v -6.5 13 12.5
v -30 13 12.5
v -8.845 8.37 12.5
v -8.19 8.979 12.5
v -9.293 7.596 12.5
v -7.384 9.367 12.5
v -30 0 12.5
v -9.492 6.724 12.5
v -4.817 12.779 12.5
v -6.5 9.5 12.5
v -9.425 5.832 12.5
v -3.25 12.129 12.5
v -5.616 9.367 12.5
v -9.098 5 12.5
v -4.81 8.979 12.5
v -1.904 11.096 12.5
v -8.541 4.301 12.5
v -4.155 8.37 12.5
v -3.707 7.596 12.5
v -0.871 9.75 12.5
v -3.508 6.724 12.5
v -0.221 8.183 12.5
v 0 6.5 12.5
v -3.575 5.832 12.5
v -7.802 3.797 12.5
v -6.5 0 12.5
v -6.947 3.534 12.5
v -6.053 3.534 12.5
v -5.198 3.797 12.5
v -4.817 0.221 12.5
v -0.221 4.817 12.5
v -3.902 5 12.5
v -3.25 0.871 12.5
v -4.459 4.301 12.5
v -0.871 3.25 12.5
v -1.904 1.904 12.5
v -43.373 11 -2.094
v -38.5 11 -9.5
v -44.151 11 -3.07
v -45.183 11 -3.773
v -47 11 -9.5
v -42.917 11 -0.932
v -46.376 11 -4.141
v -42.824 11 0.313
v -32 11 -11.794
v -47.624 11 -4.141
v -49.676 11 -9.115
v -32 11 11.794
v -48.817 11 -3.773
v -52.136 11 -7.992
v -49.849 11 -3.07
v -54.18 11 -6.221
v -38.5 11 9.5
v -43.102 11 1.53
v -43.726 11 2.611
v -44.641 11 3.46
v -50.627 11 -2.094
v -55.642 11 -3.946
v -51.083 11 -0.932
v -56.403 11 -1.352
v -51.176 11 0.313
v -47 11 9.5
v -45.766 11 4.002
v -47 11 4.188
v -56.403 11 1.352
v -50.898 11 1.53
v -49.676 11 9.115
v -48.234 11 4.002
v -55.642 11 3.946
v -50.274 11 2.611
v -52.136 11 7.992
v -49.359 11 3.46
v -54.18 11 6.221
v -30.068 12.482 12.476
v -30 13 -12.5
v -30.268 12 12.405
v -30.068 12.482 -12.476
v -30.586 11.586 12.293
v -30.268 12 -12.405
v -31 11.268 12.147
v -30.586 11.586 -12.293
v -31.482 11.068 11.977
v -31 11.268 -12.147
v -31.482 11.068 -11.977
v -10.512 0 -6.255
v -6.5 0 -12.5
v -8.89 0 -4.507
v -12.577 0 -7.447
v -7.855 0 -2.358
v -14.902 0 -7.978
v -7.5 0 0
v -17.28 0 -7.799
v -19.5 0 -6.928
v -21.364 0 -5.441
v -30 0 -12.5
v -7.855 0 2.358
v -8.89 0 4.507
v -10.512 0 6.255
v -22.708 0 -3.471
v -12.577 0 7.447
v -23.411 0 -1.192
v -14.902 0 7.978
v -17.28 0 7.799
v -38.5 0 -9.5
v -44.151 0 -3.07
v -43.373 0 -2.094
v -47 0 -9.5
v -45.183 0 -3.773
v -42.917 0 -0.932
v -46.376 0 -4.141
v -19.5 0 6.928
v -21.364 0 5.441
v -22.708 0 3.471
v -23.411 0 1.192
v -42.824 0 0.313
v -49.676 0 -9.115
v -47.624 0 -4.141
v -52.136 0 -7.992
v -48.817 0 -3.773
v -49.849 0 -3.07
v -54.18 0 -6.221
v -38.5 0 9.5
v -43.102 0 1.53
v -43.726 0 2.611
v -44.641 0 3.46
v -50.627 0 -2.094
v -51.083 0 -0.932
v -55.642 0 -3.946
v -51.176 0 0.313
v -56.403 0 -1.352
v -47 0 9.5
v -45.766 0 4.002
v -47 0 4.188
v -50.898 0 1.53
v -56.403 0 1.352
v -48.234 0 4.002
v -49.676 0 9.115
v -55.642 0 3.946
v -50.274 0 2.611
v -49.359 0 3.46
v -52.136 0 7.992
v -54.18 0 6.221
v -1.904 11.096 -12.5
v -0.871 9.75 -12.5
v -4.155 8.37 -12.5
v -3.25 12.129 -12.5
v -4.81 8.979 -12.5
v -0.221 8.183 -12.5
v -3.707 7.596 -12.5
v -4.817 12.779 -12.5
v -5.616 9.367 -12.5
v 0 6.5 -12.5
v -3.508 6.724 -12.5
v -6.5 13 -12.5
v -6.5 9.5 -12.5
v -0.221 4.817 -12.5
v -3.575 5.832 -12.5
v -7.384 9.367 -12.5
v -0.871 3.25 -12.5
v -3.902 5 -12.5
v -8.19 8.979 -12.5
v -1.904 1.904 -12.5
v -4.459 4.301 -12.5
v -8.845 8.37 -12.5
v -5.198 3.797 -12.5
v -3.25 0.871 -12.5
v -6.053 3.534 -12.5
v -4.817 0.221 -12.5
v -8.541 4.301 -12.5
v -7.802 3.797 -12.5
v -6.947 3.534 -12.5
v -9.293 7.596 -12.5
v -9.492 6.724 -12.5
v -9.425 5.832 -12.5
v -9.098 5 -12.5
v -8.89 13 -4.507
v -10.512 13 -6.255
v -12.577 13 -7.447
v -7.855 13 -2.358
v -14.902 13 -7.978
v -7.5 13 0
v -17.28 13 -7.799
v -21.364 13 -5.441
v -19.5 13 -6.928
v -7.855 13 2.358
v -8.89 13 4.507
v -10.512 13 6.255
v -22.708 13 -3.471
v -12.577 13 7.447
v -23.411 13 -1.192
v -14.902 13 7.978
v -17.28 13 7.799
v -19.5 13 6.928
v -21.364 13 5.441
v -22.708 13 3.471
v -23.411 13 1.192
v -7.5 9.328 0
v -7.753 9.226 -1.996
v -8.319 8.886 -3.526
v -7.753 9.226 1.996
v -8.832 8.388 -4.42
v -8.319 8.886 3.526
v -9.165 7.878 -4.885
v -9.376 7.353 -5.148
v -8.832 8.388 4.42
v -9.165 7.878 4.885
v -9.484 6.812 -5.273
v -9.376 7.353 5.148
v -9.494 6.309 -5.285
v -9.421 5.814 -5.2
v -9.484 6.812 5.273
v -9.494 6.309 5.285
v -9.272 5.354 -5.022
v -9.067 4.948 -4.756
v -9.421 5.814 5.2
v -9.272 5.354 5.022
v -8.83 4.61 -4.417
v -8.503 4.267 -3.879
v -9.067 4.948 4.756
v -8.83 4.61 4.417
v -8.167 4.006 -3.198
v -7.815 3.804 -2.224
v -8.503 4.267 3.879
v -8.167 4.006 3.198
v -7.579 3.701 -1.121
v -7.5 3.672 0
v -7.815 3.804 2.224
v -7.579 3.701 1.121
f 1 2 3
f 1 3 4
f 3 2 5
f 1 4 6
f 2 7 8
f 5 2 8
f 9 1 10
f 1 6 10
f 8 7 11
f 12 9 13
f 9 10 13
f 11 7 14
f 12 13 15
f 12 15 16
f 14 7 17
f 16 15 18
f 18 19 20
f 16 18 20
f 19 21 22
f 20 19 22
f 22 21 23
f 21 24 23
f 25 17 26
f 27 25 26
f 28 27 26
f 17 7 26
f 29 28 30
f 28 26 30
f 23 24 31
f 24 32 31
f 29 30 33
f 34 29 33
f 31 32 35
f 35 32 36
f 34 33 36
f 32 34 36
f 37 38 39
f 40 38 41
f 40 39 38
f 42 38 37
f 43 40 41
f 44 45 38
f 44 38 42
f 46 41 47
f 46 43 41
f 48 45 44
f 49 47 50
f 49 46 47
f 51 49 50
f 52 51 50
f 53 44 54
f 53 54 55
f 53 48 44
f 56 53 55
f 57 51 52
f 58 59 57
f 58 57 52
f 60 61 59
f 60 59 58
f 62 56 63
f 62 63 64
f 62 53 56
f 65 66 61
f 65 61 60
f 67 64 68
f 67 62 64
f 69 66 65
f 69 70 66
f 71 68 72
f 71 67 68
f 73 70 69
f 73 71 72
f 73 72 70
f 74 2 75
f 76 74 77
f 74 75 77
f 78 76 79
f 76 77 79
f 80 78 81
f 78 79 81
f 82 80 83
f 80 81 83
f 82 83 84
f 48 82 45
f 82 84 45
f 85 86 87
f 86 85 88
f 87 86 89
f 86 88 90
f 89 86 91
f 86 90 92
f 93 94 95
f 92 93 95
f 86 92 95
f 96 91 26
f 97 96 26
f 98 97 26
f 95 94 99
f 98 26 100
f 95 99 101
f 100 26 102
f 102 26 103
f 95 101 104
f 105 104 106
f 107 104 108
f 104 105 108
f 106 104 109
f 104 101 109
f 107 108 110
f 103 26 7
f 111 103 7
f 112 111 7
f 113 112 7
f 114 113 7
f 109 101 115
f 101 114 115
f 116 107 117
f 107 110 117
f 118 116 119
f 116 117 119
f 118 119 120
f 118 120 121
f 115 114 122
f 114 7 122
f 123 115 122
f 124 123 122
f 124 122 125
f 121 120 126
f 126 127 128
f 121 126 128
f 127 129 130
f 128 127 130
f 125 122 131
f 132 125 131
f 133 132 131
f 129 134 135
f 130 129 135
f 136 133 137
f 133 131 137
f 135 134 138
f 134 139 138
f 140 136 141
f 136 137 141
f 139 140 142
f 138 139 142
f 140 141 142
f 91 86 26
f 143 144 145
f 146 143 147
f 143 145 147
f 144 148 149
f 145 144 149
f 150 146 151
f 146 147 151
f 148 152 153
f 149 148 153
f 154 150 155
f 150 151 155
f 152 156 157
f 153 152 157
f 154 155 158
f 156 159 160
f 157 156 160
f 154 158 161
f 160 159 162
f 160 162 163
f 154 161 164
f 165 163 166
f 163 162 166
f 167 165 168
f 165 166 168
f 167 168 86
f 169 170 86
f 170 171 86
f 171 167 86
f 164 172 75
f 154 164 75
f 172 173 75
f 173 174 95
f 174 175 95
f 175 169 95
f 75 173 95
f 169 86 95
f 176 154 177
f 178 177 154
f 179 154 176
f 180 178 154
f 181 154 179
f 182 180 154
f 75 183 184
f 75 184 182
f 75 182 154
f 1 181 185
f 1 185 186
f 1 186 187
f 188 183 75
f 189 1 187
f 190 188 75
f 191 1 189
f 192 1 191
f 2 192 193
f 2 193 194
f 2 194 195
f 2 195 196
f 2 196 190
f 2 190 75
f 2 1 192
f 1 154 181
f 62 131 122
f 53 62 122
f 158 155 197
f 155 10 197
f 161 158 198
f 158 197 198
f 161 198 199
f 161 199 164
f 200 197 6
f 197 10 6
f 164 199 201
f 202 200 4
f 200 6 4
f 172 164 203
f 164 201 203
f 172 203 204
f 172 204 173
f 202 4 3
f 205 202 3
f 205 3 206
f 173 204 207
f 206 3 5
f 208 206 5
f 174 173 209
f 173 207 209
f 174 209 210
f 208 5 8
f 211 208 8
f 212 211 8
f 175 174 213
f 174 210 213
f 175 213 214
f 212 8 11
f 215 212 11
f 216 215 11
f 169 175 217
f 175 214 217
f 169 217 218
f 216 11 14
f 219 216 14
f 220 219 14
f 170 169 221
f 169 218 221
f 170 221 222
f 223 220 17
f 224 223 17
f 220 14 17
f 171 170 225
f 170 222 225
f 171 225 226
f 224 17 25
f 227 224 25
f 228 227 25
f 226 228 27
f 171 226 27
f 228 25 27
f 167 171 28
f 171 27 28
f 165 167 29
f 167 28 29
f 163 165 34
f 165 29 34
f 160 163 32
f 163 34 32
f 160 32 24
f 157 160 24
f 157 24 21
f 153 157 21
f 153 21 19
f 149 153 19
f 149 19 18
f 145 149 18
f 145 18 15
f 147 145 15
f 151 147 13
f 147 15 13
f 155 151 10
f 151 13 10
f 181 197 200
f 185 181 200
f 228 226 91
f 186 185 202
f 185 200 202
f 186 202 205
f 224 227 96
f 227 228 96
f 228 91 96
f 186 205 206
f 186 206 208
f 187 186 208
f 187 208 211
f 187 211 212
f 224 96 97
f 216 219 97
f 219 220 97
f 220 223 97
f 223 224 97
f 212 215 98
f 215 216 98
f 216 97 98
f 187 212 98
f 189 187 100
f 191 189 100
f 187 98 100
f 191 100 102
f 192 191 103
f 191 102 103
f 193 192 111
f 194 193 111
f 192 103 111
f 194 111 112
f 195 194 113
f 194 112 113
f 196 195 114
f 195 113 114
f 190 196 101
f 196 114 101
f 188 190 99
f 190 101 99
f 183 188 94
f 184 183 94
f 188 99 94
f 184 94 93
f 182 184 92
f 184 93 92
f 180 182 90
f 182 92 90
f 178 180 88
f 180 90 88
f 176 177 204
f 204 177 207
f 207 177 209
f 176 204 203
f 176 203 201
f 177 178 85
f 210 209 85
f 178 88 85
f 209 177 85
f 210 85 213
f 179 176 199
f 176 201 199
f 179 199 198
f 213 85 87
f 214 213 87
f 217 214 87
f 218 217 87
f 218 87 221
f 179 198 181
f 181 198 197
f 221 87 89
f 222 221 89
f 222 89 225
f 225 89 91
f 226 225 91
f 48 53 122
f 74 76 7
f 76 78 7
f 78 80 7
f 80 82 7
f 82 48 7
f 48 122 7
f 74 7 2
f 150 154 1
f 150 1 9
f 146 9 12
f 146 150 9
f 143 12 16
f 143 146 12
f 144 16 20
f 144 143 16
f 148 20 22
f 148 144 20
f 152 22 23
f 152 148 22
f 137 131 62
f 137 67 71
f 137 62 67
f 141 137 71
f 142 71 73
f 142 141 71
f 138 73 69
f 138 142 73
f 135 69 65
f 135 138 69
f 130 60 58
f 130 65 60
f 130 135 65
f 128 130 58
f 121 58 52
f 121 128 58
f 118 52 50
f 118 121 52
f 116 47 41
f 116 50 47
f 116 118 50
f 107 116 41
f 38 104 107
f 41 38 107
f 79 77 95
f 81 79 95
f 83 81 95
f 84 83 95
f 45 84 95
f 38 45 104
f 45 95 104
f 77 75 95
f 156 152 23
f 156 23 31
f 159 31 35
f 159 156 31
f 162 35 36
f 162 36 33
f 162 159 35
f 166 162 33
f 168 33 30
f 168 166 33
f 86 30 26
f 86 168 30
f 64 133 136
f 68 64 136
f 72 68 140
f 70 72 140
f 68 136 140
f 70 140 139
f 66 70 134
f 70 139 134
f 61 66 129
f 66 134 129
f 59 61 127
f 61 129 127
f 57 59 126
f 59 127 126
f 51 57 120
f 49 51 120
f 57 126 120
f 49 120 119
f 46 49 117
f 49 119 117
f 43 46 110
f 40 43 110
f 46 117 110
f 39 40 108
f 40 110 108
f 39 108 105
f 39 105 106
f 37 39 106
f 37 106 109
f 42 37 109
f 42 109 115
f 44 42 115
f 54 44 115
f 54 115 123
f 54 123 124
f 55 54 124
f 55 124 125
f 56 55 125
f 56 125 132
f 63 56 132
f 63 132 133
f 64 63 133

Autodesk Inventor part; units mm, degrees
ref_plane "YZ Plane" through (0, 0, 0) normal (1, 0, 0) x (0, 1, 0)
ref_plane "XZ Plane" through (0, 0, 0) normal (0, 1, 0) x (-1, 0, 0)
ref_plane "XY Plane" through (0, 0, 0) normal (0, 0, 1) x (1, 0, 0)
sketch "Skizze1" plane through (0, 0, 0) normal (0, 1, 0) x (-1, 0, 0)
  line L0 (0, 12.5) -> (0, -12.5)
  line L1 (0, -12.5) -> (30, -12.5)
  arc A0 (47, -9.5) -> (47, 9.5) centre (47, 0) ccw
  line L2 (47, 9.5) -> (38.5, 9.5)
  line L3 (38.5, 9.5) -> (30, 12.5)
  line L4 (30, 12.5) -> (0, 12.5)
  line L5 (0, 0) -> (47, 0) construction
  line L6 (30, -12.5) -> (38.5, -9.5)
  line L7 (38.5, -9.5) -> (47, -9.5)
  line L8 (30, 12.5) -> (30, -12.5)
  point P0 (56.5, 0)
  dimension "d0" = 90
  dimension "d1" = 25
  dimension "d2" = 30
  dimension "d3" = 47
  dimension "d5" = 8.5
  dimension "d6" = 18
  dimension "d9" = 30
extrude "Extrusion2" add sketch "Skizze1" along normal blind 13 contours L4 L8 L1 L0
extrude "Extrusion3" add sketch "Skizze1" along normal blind 11 contours L3 L2 A0 L7 L6 L8
fillet "Rundung1" radius 2 1 edges at (-30, 11, 0)
fillet "Rundung2" radius 6.5 2 edges at (0, 0, 0) (0, 13, 0)
sketch "Skizze2" plane through (-30, 0, -12.5) normal (0, 0, -1) x (-1, 0, 0)
  arc A0 (-23.5, 13) -> (-23.5, 0) centre (-23.5, 6.5) ccw projected
  point P0 (-30, 0)
hole "Bohrung1" at (-6.5, 6.5, -12.5) direction (0, 0, 1) diameter 6 depth 25
sketch "Skizze3" plane through (0, 11, 0) normal (0, 1, 0) x (1, 0, 0)
  arc A0 (-47, 9.5) -> (-47, -9.5) centre (-47, 0) ccw projected
  point P0 (0, 0)
hole "Bohrung2" at (-47, 11, 0) direction (0, -1, 0) diameter 8.376 depth 11 thread size "M10x1.5" class "6H" standard "ISO Metric profile"
sketch "Sketch4" plane through (0, 0, 0) normal (0, -1, 0) x (1, 0, 0)
  circle A0 centre (-15.5, 0) radius 8
  line L0 (-6.5, 12.5) -> (-6.5, -12.5) projected
  point P0 (0, 0)
  dimension "d30" = 16
  dimension "d33" = 9
extrude "Extrusion4" cut sketch "Sketch4" against normal up to surface (13 mm away)
properties part number "2012"
